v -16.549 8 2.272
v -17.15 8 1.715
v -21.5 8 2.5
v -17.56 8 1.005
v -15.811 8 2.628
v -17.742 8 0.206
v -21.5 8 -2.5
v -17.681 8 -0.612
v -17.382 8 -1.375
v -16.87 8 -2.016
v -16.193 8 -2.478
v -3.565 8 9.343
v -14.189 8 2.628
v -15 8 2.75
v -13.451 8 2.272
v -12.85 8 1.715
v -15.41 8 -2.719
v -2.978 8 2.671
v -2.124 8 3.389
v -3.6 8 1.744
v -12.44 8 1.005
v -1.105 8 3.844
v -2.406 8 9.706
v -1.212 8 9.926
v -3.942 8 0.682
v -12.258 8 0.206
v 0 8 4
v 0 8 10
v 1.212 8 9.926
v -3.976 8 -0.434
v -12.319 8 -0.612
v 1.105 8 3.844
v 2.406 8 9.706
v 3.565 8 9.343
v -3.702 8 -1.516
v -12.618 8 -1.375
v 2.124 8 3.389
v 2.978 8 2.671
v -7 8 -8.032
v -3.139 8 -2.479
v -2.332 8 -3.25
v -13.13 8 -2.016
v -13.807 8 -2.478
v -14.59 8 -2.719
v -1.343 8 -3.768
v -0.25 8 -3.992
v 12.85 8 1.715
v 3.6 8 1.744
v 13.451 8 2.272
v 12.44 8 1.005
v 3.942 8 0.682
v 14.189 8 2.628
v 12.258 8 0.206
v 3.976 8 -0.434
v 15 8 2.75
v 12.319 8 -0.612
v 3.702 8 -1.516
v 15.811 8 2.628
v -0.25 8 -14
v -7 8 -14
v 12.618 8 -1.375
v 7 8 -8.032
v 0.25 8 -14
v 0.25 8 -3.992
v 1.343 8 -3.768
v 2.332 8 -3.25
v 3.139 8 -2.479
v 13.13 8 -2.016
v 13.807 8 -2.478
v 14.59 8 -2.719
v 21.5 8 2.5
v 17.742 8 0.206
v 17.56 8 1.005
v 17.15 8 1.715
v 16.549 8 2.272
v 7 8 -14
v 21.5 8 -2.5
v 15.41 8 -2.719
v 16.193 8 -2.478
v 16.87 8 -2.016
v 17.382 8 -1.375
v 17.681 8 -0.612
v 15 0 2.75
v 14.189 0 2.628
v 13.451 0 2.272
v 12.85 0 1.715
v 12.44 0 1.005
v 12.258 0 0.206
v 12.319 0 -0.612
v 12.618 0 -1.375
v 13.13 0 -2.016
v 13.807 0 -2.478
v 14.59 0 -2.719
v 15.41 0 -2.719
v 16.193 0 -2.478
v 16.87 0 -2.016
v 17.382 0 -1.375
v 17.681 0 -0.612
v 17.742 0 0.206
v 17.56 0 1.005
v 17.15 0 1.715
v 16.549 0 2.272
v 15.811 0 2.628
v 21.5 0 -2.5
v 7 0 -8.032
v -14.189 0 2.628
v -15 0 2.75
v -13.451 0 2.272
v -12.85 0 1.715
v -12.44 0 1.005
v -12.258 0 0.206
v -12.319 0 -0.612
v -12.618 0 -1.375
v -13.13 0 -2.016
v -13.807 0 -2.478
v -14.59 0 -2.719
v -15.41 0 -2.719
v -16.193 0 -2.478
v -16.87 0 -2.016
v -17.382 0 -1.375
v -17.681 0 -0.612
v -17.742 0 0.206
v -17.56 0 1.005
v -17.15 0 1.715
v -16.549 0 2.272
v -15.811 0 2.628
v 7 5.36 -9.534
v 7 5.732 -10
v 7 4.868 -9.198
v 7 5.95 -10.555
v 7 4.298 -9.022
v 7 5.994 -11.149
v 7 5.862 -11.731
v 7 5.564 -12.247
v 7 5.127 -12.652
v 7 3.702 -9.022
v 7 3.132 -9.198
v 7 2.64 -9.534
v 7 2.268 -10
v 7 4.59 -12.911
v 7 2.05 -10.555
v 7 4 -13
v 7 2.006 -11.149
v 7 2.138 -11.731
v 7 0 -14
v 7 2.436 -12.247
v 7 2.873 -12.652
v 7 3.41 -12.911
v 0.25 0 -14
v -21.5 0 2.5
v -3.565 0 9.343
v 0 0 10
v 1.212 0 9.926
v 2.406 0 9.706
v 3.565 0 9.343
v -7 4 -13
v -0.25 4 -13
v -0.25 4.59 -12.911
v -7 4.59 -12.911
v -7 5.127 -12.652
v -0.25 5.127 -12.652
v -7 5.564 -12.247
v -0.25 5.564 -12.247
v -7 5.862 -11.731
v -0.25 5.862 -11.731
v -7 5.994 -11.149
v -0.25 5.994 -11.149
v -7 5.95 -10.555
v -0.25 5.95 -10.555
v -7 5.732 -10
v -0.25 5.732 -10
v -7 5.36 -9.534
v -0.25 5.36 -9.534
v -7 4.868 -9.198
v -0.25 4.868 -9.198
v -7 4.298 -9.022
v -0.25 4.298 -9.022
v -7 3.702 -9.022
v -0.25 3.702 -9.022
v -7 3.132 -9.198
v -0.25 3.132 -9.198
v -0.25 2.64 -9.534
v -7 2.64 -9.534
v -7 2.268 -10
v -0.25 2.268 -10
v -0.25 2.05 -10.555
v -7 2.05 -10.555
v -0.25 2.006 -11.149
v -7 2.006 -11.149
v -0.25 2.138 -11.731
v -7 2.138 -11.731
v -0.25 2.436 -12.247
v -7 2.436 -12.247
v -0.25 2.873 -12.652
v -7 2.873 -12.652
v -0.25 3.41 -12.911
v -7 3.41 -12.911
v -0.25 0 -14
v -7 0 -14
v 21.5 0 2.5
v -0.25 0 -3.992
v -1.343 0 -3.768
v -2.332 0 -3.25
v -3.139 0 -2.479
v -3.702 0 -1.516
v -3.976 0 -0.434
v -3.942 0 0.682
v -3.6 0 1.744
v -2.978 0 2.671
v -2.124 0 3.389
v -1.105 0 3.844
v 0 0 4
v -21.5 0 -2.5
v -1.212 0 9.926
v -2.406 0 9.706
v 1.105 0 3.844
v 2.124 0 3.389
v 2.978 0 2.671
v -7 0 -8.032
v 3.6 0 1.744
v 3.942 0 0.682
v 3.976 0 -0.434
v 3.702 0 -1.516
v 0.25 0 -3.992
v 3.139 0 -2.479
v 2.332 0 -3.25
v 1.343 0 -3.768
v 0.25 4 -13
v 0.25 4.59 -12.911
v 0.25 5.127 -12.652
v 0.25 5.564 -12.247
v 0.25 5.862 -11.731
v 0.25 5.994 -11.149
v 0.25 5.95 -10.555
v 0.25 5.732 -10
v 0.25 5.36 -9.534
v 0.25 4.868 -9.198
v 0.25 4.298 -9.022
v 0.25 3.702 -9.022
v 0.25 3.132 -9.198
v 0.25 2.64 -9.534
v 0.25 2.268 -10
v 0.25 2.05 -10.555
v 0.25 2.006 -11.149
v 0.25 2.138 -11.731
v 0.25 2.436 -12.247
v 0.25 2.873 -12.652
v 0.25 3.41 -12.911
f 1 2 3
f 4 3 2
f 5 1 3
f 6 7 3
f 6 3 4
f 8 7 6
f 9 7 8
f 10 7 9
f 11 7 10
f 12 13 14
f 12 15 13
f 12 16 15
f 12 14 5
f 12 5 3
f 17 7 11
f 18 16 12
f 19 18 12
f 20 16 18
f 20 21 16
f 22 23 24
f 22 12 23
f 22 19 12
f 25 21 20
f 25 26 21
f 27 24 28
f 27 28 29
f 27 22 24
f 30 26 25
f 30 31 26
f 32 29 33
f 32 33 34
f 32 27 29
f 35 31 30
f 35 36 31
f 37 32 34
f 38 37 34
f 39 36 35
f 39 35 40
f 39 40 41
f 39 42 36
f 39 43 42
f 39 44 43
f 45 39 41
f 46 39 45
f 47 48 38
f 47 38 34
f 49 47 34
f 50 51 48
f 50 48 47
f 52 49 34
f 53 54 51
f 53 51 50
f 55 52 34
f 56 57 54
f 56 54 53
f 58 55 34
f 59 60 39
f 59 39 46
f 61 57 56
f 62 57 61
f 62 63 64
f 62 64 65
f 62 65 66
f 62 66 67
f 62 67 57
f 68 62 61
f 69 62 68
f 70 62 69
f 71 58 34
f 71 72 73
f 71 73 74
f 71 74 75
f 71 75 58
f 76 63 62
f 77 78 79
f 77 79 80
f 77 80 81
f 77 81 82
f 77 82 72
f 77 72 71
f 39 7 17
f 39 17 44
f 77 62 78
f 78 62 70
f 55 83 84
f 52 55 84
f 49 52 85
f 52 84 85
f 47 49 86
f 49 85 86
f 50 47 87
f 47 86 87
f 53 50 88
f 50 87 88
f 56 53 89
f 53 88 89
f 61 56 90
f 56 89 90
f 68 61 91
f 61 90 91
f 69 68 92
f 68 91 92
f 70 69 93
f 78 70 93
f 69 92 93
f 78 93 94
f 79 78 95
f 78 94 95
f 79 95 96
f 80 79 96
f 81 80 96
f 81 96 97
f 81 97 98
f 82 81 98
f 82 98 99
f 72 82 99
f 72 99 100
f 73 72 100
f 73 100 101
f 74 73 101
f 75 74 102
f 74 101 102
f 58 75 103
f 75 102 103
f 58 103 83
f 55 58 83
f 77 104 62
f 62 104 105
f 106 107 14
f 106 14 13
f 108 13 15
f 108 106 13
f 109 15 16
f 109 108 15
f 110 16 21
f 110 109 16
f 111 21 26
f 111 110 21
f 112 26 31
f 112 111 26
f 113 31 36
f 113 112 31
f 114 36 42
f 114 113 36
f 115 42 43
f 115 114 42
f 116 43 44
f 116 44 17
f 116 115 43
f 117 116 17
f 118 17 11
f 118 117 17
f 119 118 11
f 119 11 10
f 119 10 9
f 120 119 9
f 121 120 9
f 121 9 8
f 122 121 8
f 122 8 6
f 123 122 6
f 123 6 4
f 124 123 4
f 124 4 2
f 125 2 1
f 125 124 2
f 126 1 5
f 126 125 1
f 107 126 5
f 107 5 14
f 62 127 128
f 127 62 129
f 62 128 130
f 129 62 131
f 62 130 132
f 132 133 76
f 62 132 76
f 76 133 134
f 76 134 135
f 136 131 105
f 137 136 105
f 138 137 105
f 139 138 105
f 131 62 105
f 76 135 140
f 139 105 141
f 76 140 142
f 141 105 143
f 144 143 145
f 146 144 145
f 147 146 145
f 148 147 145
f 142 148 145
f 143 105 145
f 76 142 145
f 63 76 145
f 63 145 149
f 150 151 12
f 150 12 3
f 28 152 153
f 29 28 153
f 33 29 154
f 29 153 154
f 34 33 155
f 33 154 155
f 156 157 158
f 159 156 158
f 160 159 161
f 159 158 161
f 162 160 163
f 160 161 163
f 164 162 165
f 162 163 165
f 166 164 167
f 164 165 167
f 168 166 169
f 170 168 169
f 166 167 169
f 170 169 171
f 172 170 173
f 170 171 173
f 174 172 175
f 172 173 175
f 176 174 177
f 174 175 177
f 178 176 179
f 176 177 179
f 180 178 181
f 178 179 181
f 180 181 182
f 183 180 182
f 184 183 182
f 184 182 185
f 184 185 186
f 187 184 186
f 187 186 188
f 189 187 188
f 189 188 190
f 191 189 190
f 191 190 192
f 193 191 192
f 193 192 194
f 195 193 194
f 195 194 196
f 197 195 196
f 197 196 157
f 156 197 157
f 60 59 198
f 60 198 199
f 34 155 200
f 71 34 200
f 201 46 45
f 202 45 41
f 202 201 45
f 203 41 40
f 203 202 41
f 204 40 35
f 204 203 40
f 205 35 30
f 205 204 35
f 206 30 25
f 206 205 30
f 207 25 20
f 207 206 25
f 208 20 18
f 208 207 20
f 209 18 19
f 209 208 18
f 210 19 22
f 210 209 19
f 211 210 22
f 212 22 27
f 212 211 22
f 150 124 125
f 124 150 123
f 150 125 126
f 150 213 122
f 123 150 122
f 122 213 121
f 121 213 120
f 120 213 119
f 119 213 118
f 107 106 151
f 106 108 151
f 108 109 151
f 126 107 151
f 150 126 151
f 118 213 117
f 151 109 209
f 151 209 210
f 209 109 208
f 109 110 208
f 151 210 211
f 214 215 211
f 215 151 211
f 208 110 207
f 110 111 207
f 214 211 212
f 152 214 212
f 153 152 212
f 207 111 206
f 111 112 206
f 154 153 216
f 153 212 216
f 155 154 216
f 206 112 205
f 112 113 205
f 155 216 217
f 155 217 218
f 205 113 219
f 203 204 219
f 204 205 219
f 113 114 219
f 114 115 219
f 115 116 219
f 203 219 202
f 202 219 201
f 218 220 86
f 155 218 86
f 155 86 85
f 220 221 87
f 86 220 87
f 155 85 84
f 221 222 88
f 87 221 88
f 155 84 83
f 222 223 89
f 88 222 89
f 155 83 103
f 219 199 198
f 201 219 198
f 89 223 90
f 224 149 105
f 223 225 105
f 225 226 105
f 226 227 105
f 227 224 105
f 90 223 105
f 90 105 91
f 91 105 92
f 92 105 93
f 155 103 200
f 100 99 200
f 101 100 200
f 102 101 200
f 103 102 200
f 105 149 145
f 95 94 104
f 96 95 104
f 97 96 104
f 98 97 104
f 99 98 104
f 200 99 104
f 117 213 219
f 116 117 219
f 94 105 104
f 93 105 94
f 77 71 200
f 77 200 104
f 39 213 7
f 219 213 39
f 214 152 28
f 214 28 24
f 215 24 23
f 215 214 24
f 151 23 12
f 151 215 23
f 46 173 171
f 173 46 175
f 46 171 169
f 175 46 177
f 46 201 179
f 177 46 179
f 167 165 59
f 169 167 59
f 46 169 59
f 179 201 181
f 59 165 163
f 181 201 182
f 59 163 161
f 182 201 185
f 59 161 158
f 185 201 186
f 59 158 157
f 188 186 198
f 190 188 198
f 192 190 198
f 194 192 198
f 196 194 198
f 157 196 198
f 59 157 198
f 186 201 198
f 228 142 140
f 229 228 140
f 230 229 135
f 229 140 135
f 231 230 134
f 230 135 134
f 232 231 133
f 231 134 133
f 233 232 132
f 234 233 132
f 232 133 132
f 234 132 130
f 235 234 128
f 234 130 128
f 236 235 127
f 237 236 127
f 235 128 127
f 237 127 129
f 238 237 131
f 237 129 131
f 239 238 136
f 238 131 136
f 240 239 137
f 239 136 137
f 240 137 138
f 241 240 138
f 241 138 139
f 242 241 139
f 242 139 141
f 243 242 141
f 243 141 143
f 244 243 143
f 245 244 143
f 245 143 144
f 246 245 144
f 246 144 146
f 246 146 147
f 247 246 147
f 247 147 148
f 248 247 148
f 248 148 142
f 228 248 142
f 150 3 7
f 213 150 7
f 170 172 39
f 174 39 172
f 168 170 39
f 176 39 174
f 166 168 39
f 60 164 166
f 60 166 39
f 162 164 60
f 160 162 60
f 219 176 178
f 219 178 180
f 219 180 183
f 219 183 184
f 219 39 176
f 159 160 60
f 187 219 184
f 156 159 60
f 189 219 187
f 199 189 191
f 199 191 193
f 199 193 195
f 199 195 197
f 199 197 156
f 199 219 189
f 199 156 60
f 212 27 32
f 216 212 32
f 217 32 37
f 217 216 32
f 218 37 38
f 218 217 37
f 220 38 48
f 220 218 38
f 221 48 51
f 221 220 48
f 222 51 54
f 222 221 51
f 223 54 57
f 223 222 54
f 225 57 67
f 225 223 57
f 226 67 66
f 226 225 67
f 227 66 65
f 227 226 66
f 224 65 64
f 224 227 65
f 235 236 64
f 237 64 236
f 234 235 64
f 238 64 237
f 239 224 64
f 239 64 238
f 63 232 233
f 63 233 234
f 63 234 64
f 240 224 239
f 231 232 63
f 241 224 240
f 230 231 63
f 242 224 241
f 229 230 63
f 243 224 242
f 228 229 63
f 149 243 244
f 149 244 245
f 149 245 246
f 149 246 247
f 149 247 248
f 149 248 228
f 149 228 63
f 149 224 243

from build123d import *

# Parameters (mm, degrees)
SKETCH1_R             = 2.75
BOSS_EXTRUDE1_DEPTH   = 8
CROQUIS1_R            = 4
CORTAR_EXTRUIR1_DEPTH = 27.874709301
CROQUIS2_W            = 0.5
CROQUIS2_H            = 20
CORTAR_EXTRUIR2_DEPTH = 27.874709301
SKETCH3_R             = 2
CUT_EXTRUDE1_DEPTH    = 33.74522866


with BuildPart() as part:
    # Sketch1 → Boss-Extrude1 (new body)
    with BuildSketch(Plane(origin=(0, 0, 0), x_dir=(1, 0, 0), z_dir=(0, 1, 0))):
        with BuildLine():
            Line((0, 14), (0, -10))
            ThreePointArc((0, -10), (-1.812396329, -9.834389638), (-3.564762336, -9.343043909))
            Line((-3.564762336, -9.343043909), (-21.5, -2.5))
            Line((-21.5, -2.5), (-21.5, 2.5))
            Line((-21.5, 2.5), (-7, 8.032356947))
            Line((-7, 8.032356947), (-7, 14))
            Line((-7, 14), (0, 14))
        make_face()
        with Locations(Location((-15, 0, 0), (0, 0, 270))):
            Circle(SKETCH1_R, mode=Mode.SUBTRACT)
    boss_extrude1 = extrude(amount=BOSS_EXTRUDE1_DEPTH)

    # Simetría1: Boss-Extrude1 across plane
    add(boss_extrude1.mirror(Plane(origin=(0, 8, -14), x_dir=(0, 0, 1), z_dir=(-1, 0, 0))))

    # Croquis1 → Cortar-Extruir1 (cut, through all)
    with BuildSketch(Plane(origin=(0, 0, 0), x_dir=(1, 0, 0), z_dir=(0, 1, 0))):
        with Locations(Location((0, 0, 0), (0, 0, 270))):
            Circle(CROQUIS1_R)
    extrude(amount=CORTAR_EXTRUIR1_DEPTH, mode=Mode.SUBTRACT)

    # Croquis2 → Cortar-Extruir2 (cut, through all)
    with BuildSketch(Plane(origin=(0, 0, 0), x_dir=(1, 0, 0), z_dir=(0, 1, 0))):
        with Locations((0, 10)):
            Rectangle(CROQUIS2_W, CROQUIS2_H)
    extrude(amount=CORTAR_EXTRUIR2_DEPTH, mode=Mode.SUBTRACT)

    # Sketch3 → Cut-Extrude1 (cut, through all)
    with BuildSketch(Plane(origin=(7, 0, 0), x_dir=(0, 0, -1), z_dir=(1, 0, 0))):
        with Locations((11, 4)):
            Circle(SKETCH3_R)
    extrude(amount=-CUT_EXTRUDE1_DEPTH, mode=Mode.SUBTRACT)


solid = part.part
